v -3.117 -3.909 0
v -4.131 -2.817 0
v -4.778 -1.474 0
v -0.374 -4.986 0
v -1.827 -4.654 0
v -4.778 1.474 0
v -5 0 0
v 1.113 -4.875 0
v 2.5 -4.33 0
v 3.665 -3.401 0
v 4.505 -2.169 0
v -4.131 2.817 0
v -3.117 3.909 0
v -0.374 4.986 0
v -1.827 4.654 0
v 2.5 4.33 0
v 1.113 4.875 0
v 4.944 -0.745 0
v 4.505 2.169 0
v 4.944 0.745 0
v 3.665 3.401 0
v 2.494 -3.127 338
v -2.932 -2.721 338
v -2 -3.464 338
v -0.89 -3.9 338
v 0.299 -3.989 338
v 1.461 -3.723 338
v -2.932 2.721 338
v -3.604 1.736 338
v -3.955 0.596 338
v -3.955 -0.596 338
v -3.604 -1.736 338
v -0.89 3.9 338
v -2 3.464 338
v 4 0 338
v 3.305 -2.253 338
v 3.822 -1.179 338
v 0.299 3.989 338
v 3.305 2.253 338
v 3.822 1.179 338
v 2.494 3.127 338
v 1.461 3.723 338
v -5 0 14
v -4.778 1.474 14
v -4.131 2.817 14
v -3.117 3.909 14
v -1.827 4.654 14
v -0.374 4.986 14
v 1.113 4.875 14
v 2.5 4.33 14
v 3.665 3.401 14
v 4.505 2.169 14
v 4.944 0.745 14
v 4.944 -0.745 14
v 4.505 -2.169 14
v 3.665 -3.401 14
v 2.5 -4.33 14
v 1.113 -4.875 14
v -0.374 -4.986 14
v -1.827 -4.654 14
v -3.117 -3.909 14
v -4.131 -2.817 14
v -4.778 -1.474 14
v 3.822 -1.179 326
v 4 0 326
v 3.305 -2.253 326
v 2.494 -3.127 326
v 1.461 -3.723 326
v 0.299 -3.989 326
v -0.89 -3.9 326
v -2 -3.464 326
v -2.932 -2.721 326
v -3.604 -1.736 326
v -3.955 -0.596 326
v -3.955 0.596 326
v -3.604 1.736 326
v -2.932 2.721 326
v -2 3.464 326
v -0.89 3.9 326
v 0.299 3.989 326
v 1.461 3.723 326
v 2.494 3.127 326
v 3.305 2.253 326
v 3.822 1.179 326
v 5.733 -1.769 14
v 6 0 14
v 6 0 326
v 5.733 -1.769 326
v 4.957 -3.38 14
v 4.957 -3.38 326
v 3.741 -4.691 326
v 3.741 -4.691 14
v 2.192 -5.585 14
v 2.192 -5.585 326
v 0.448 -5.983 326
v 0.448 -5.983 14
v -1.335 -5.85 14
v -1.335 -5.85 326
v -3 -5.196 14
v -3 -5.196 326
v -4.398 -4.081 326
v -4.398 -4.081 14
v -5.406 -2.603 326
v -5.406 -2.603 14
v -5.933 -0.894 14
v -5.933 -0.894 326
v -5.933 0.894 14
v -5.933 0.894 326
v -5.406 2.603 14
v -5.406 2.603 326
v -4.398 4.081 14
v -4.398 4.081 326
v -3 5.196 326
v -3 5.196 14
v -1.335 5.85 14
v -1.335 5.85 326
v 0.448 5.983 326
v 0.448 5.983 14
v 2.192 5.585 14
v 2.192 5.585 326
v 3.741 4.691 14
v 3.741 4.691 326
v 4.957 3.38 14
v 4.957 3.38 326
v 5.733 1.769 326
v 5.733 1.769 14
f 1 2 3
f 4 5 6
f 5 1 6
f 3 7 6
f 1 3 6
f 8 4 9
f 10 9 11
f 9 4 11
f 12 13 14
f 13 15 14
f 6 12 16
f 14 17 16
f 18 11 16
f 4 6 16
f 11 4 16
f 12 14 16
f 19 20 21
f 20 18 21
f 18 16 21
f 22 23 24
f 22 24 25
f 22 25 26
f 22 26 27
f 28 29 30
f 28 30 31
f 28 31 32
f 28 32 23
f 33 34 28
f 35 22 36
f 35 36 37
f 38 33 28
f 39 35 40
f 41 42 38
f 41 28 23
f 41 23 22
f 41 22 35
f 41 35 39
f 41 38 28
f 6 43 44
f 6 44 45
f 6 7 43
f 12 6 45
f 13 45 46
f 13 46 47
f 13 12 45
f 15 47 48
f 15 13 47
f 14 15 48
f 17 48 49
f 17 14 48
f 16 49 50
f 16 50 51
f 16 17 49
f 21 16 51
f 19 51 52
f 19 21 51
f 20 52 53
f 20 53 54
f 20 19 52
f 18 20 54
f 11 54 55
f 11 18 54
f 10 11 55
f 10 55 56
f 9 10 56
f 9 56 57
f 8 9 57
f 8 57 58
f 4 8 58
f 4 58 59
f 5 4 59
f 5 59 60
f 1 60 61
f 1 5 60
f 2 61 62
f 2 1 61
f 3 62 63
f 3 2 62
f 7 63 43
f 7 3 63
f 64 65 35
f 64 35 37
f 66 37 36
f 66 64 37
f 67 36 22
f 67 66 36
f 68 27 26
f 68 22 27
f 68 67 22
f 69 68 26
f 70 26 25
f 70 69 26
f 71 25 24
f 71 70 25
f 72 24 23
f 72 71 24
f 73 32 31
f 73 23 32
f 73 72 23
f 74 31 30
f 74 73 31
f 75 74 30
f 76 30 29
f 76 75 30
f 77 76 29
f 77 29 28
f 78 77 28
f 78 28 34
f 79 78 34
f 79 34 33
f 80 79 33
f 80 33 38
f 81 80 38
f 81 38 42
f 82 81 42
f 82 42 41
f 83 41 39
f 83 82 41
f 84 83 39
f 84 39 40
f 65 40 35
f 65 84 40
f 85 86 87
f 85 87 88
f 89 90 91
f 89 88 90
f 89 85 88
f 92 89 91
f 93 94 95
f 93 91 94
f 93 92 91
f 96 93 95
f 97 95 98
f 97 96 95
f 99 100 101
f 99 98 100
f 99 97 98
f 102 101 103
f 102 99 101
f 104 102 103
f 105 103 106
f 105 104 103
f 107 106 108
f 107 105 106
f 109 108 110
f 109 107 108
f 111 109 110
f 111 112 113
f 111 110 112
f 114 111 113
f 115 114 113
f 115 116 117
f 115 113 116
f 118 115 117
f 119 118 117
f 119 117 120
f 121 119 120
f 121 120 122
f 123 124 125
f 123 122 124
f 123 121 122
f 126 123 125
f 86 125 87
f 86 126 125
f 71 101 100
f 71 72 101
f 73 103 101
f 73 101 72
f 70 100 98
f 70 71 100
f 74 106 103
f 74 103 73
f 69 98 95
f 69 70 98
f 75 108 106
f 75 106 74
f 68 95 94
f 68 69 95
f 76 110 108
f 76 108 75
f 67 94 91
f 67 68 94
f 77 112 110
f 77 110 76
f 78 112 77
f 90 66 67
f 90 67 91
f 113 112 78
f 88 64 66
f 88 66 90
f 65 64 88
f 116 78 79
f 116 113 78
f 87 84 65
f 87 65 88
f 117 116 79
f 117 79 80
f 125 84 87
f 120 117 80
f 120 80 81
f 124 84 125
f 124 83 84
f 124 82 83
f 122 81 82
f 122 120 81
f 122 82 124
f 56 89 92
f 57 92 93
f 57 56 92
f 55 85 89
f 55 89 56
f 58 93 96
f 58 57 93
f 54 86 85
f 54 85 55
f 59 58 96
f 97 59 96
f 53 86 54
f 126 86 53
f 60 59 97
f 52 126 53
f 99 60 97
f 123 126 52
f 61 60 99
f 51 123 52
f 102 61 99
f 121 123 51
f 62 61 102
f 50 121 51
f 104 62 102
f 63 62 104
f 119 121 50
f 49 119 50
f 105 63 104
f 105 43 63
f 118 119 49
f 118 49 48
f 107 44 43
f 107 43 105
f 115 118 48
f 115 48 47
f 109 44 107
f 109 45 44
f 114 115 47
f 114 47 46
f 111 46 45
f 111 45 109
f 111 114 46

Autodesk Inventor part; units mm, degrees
ref_plane "YZ Plane" through (0, 0, 0) normal (1, 0, 0) x (0, 1, 0)
ref_plane "XZ Plane" through (0, 0, 0) normal (0, 1, 0) x (-1, 0, 0)
ref_plane "XY Plane" through (0, 0, 0) normal (0, 0, 1) x (1, 0, 0)
sketch "Sketch1" plane through (0, 0, 0) normal (0, 0, 1) x (1, 0, 0)
  circle A0 centre (0, 0) radius 6
  dimension "d0" = 12
extrude "Extrusion1" add sketch "Sketch1" along normal blind 326
sketch "Sketch2" plane through (0, 0, 326) normal (0, 0, 1) x (1, 0, 0)
  circle A0 centre (0, 0) radius 4
  dimension "d3" = 8
extrude "Extrusion2" add sketch "Sketch2" along normal blind 12
thread "Thread1" size "M12x1.5" class "6g" standard "ANSI Metric M Profile" length 348
sketch "Sketch3" plane through (0, 0, 0) normal (0, 0, -1) x (-1, 0, 0)
  circle A0 centre (0, 0) radius 5
  circle A1 centre (0, 0) radius 6
  dimension "d8" = 10
  dimension "d9" = 12
extrude "Extrusion3" cut sketch "Sketch3" against normal blind 14
properties part number "Tornillo de Vínculo Cabezal" material "Steel"
